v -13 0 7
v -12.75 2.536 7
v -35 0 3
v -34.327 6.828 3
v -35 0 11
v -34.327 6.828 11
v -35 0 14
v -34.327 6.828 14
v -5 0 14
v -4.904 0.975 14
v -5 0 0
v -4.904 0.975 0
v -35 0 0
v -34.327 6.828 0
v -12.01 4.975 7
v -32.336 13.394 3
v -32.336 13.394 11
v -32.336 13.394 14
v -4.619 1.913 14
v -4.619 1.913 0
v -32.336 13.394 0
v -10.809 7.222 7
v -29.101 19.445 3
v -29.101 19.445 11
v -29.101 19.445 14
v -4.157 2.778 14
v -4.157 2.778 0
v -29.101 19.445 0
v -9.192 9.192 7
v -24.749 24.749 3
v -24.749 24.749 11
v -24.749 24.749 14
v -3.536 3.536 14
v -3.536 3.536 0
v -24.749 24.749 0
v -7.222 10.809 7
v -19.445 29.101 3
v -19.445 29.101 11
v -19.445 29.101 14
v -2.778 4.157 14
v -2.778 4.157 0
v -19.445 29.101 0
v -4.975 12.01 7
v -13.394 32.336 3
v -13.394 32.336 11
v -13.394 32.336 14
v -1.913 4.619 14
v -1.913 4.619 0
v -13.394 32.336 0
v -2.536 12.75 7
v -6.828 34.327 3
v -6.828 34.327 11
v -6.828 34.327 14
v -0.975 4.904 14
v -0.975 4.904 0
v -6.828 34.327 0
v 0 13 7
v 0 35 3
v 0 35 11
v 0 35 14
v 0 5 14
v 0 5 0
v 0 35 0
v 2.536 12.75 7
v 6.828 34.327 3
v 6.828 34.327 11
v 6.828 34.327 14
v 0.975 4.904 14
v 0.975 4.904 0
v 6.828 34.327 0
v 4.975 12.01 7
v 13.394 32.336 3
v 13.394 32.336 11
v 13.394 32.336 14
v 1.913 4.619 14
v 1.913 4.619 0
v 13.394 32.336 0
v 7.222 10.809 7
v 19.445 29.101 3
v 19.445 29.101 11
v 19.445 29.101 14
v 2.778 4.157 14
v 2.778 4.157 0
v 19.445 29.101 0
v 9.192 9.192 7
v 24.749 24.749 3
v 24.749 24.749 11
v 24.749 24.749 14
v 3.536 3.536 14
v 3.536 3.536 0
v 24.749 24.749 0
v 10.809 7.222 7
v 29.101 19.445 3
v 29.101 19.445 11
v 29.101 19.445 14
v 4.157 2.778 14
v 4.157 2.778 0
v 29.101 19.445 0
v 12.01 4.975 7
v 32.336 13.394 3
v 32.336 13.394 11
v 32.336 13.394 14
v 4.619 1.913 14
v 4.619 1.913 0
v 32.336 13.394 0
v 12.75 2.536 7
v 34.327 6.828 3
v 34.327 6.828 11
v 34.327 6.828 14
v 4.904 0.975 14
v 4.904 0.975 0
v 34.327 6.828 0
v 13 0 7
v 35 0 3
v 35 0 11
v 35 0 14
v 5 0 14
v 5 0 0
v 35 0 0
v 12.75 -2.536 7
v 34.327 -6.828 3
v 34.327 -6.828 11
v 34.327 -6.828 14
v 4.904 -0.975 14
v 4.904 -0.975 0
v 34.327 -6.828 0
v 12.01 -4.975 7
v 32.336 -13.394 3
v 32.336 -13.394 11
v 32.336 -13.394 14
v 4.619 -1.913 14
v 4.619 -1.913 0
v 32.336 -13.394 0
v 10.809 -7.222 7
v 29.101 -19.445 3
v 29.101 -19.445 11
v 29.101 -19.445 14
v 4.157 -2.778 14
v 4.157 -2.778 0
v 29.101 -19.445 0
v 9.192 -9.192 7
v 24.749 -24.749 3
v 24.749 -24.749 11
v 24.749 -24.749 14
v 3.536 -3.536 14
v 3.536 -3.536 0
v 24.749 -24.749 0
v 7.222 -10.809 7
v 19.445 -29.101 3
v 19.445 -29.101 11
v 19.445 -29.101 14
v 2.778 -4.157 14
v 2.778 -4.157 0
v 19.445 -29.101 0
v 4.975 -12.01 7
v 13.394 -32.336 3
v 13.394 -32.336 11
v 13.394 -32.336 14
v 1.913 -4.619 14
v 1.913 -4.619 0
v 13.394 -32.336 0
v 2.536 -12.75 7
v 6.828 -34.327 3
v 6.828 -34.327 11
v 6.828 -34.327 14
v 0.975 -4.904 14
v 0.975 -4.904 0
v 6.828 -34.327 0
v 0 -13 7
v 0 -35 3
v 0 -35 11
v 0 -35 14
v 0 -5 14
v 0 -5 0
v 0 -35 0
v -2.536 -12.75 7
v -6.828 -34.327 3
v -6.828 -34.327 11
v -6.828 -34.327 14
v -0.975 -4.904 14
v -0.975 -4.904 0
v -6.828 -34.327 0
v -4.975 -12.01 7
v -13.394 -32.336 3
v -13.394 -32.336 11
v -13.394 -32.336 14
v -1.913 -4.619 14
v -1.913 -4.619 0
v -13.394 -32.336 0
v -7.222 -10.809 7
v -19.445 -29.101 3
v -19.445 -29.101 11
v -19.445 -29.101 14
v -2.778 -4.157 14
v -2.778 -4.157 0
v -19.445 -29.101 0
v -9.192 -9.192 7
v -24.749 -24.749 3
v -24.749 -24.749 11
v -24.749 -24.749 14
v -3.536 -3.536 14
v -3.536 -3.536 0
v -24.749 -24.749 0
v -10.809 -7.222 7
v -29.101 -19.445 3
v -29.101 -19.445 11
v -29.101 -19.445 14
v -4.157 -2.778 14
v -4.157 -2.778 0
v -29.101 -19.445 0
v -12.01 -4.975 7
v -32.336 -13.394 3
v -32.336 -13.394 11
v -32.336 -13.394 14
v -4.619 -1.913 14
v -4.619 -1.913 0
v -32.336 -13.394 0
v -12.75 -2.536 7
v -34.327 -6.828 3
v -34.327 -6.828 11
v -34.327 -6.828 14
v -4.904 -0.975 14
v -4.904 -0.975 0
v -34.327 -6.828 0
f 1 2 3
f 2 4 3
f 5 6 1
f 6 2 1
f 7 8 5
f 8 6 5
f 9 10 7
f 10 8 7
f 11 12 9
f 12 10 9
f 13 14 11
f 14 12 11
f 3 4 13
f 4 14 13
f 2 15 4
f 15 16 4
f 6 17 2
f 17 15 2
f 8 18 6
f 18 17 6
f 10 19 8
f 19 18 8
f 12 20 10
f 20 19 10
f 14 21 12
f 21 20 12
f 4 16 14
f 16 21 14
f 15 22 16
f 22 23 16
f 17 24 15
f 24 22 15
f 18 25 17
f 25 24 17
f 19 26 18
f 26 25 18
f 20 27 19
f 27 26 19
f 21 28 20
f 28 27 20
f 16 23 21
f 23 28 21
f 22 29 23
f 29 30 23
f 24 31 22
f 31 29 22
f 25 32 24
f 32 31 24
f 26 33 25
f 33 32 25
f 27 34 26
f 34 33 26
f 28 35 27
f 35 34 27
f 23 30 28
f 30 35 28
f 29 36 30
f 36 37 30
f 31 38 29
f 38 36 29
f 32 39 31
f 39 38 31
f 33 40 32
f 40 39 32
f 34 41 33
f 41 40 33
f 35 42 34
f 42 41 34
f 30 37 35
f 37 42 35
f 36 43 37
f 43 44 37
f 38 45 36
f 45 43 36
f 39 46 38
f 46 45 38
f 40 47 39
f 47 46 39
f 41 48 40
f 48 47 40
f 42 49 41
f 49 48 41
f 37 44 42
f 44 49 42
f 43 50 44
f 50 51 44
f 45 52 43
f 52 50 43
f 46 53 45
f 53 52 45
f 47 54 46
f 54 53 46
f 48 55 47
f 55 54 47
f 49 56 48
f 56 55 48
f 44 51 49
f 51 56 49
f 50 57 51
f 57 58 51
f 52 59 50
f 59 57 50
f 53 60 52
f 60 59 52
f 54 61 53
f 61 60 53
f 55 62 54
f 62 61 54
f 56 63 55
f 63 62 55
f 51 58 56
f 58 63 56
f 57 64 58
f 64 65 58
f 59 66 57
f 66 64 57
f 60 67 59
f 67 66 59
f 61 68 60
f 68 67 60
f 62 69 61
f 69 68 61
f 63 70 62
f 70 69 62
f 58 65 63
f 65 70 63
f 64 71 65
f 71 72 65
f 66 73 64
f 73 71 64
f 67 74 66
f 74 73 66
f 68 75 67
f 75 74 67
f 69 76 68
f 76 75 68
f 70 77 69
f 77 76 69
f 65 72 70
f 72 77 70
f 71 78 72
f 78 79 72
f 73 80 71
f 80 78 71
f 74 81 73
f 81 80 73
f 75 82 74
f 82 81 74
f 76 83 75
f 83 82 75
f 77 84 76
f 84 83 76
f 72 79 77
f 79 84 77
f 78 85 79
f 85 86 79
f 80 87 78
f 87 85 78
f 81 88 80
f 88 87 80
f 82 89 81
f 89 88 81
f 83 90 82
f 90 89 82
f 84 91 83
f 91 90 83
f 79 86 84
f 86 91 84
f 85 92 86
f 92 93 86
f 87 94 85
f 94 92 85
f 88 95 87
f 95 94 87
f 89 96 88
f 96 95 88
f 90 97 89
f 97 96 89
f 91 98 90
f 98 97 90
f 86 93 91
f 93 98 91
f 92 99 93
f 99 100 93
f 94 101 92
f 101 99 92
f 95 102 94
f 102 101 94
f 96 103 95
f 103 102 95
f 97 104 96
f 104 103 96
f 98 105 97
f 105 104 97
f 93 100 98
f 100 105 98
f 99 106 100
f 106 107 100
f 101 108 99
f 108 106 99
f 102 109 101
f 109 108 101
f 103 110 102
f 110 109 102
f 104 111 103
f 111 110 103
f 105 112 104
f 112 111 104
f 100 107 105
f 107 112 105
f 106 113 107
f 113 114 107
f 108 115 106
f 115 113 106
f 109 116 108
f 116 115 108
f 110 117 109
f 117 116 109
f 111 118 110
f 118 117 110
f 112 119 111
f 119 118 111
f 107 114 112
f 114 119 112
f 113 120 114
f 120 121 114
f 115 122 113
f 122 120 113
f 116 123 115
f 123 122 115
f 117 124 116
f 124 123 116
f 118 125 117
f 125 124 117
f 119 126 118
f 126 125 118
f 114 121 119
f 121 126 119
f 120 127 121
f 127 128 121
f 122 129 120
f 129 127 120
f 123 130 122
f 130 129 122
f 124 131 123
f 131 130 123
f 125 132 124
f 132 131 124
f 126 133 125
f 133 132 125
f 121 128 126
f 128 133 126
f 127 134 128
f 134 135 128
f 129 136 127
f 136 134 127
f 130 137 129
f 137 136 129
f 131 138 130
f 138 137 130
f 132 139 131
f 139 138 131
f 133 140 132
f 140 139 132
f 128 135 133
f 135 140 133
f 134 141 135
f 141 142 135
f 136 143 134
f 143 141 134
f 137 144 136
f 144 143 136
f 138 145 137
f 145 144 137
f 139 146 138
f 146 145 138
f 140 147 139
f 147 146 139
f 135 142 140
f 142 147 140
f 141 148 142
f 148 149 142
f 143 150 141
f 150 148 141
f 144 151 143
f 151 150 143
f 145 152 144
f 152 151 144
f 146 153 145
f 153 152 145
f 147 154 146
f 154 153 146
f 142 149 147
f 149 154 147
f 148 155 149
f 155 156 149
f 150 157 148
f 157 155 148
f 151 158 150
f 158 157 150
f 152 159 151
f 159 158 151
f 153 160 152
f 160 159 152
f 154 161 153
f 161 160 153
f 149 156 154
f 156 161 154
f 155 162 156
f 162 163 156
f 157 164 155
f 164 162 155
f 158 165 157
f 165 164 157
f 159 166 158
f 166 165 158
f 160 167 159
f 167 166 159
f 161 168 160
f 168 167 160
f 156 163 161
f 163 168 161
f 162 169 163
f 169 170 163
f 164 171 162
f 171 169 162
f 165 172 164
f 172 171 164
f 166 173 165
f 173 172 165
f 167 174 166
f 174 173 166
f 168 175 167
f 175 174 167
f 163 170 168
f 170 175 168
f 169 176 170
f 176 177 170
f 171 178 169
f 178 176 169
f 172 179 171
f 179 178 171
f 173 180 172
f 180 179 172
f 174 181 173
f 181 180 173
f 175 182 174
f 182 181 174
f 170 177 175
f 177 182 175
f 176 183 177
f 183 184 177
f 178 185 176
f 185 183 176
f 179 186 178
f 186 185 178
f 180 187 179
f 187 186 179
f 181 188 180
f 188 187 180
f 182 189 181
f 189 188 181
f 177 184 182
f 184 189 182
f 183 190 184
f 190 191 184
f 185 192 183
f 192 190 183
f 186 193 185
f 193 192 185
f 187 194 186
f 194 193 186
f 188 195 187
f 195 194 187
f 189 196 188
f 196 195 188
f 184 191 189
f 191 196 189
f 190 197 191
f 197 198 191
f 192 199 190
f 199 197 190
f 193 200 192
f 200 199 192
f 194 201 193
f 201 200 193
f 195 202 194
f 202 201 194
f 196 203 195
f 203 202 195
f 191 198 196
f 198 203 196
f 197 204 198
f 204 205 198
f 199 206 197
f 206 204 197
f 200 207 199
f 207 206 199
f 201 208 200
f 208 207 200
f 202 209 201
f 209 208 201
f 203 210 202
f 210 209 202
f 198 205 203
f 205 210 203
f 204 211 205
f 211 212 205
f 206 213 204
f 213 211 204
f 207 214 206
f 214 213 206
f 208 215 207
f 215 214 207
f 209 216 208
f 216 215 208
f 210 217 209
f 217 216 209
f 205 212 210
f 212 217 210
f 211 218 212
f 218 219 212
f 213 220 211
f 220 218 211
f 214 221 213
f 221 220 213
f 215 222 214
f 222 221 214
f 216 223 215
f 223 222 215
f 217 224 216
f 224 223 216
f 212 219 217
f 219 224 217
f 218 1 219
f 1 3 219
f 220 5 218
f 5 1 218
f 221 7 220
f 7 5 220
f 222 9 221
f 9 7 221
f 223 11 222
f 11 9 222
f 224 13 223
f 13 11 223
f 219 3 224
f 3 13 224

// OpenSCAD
$fn = 32;

// ----------------------------------------------------------------------
// Revolved part: V-groove pulley R35
// ----------------------------------------------------------------------

// --- parameters (mm) ---
bore_r = 5;               // bore radius
rim_r = 35;               // rim radius
rim_t = 14;               // rim width
groove_r = 13;            // groove root radius
groove_w = 4;             // groove half width
revolve_angle = 360;      // revolve sweep, degrees

bore_d = 2 * bore_r;
rim_d = 2 * rim_r;
groove_d = 2 * groove_r;

profile = [[5, 0], [35, 0], [35, 3], [13, 7], [35, 11], [35, 14], [5, 14]];  // primary outline, 7 points, counter clockwise

// --- the one profile operation ---
rotate_extrude(angle = revolve_angle) polygon(points = profile);
